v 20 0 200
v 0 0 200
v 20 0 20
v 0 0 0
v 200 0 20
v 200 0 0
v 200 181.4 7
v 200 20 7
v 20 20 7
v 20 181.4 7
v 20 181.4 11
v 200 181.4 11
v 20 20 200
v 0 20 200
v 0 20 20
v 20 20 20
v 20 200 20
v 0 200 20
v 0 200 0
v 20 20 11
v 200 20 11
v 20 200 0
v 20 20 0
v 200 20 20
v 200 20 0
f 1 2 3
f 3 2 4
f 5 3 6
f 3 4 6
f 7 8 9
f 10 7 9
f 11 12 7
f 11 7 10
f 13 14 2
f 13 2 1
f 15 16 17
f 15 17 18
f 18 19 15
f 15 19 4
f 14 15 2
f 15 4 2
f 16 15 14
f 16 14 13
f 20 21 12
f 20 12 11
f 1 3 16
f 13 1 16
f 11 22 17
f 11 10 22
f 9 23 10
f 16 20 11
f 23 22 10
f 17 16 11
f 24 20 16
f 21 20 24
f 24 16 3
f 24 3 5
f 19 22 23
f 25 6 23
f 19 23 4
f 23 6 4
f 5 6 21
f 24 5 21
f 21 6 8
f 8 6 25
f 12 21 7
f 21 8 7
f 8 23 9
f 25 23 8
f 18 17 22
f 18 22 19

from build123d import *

# Parameters (mm, degrees)
F0_W     = 200
F0_H     = 20
F1_DEPTH = 20
F2_W     = 20
F2_H     = 20
F3_DEPTH = 180
F4_W     = 20
F4_H     = 20
F5_DEPTH = 180
F6_W     = 180
F6_H     = 4
F7_DEPTH = 161.4


with BuildPart() as f1:
    # F0 (on Top) → F1 (new body)
    with BuildSketch(Plane.XY):
        with Locations((100, 10)):
            Rectangle(F0_W, F0_H)
    extrude(amount=F1_DEPTH)

    # F2 (on face) → F3 (join)
    with BuildSketch(Plane.XY.offset(20)):
        with Locations((10, 10)):
            Rectangle(F2_W, F2_H)
    extrude(amount=F3_DEPTH)

    # F4 (on face) → F5 (join)
    with BuildSketch(Plane(origin=(0, 20, 0), x_dir=(-1, 0, 0), z_dir=(0, 1, 0))):
        with Locations((-10, 10)):
            Rectangle(F4_W, F4_H)
    extrude(amount=F5_DEPTH)

    # F6 (on face) → F7 (join)
    with BuildSketch(Plane(origin=(0, 20, 0), x_dir=(-1, 0, 0), z_dir=(0, 1, 0))):
        with Locations((-110, 9)):
            Rectangle(F6_W, F6_H)
    extrude(amount=F7_DEPTH)


solid = f1.part
